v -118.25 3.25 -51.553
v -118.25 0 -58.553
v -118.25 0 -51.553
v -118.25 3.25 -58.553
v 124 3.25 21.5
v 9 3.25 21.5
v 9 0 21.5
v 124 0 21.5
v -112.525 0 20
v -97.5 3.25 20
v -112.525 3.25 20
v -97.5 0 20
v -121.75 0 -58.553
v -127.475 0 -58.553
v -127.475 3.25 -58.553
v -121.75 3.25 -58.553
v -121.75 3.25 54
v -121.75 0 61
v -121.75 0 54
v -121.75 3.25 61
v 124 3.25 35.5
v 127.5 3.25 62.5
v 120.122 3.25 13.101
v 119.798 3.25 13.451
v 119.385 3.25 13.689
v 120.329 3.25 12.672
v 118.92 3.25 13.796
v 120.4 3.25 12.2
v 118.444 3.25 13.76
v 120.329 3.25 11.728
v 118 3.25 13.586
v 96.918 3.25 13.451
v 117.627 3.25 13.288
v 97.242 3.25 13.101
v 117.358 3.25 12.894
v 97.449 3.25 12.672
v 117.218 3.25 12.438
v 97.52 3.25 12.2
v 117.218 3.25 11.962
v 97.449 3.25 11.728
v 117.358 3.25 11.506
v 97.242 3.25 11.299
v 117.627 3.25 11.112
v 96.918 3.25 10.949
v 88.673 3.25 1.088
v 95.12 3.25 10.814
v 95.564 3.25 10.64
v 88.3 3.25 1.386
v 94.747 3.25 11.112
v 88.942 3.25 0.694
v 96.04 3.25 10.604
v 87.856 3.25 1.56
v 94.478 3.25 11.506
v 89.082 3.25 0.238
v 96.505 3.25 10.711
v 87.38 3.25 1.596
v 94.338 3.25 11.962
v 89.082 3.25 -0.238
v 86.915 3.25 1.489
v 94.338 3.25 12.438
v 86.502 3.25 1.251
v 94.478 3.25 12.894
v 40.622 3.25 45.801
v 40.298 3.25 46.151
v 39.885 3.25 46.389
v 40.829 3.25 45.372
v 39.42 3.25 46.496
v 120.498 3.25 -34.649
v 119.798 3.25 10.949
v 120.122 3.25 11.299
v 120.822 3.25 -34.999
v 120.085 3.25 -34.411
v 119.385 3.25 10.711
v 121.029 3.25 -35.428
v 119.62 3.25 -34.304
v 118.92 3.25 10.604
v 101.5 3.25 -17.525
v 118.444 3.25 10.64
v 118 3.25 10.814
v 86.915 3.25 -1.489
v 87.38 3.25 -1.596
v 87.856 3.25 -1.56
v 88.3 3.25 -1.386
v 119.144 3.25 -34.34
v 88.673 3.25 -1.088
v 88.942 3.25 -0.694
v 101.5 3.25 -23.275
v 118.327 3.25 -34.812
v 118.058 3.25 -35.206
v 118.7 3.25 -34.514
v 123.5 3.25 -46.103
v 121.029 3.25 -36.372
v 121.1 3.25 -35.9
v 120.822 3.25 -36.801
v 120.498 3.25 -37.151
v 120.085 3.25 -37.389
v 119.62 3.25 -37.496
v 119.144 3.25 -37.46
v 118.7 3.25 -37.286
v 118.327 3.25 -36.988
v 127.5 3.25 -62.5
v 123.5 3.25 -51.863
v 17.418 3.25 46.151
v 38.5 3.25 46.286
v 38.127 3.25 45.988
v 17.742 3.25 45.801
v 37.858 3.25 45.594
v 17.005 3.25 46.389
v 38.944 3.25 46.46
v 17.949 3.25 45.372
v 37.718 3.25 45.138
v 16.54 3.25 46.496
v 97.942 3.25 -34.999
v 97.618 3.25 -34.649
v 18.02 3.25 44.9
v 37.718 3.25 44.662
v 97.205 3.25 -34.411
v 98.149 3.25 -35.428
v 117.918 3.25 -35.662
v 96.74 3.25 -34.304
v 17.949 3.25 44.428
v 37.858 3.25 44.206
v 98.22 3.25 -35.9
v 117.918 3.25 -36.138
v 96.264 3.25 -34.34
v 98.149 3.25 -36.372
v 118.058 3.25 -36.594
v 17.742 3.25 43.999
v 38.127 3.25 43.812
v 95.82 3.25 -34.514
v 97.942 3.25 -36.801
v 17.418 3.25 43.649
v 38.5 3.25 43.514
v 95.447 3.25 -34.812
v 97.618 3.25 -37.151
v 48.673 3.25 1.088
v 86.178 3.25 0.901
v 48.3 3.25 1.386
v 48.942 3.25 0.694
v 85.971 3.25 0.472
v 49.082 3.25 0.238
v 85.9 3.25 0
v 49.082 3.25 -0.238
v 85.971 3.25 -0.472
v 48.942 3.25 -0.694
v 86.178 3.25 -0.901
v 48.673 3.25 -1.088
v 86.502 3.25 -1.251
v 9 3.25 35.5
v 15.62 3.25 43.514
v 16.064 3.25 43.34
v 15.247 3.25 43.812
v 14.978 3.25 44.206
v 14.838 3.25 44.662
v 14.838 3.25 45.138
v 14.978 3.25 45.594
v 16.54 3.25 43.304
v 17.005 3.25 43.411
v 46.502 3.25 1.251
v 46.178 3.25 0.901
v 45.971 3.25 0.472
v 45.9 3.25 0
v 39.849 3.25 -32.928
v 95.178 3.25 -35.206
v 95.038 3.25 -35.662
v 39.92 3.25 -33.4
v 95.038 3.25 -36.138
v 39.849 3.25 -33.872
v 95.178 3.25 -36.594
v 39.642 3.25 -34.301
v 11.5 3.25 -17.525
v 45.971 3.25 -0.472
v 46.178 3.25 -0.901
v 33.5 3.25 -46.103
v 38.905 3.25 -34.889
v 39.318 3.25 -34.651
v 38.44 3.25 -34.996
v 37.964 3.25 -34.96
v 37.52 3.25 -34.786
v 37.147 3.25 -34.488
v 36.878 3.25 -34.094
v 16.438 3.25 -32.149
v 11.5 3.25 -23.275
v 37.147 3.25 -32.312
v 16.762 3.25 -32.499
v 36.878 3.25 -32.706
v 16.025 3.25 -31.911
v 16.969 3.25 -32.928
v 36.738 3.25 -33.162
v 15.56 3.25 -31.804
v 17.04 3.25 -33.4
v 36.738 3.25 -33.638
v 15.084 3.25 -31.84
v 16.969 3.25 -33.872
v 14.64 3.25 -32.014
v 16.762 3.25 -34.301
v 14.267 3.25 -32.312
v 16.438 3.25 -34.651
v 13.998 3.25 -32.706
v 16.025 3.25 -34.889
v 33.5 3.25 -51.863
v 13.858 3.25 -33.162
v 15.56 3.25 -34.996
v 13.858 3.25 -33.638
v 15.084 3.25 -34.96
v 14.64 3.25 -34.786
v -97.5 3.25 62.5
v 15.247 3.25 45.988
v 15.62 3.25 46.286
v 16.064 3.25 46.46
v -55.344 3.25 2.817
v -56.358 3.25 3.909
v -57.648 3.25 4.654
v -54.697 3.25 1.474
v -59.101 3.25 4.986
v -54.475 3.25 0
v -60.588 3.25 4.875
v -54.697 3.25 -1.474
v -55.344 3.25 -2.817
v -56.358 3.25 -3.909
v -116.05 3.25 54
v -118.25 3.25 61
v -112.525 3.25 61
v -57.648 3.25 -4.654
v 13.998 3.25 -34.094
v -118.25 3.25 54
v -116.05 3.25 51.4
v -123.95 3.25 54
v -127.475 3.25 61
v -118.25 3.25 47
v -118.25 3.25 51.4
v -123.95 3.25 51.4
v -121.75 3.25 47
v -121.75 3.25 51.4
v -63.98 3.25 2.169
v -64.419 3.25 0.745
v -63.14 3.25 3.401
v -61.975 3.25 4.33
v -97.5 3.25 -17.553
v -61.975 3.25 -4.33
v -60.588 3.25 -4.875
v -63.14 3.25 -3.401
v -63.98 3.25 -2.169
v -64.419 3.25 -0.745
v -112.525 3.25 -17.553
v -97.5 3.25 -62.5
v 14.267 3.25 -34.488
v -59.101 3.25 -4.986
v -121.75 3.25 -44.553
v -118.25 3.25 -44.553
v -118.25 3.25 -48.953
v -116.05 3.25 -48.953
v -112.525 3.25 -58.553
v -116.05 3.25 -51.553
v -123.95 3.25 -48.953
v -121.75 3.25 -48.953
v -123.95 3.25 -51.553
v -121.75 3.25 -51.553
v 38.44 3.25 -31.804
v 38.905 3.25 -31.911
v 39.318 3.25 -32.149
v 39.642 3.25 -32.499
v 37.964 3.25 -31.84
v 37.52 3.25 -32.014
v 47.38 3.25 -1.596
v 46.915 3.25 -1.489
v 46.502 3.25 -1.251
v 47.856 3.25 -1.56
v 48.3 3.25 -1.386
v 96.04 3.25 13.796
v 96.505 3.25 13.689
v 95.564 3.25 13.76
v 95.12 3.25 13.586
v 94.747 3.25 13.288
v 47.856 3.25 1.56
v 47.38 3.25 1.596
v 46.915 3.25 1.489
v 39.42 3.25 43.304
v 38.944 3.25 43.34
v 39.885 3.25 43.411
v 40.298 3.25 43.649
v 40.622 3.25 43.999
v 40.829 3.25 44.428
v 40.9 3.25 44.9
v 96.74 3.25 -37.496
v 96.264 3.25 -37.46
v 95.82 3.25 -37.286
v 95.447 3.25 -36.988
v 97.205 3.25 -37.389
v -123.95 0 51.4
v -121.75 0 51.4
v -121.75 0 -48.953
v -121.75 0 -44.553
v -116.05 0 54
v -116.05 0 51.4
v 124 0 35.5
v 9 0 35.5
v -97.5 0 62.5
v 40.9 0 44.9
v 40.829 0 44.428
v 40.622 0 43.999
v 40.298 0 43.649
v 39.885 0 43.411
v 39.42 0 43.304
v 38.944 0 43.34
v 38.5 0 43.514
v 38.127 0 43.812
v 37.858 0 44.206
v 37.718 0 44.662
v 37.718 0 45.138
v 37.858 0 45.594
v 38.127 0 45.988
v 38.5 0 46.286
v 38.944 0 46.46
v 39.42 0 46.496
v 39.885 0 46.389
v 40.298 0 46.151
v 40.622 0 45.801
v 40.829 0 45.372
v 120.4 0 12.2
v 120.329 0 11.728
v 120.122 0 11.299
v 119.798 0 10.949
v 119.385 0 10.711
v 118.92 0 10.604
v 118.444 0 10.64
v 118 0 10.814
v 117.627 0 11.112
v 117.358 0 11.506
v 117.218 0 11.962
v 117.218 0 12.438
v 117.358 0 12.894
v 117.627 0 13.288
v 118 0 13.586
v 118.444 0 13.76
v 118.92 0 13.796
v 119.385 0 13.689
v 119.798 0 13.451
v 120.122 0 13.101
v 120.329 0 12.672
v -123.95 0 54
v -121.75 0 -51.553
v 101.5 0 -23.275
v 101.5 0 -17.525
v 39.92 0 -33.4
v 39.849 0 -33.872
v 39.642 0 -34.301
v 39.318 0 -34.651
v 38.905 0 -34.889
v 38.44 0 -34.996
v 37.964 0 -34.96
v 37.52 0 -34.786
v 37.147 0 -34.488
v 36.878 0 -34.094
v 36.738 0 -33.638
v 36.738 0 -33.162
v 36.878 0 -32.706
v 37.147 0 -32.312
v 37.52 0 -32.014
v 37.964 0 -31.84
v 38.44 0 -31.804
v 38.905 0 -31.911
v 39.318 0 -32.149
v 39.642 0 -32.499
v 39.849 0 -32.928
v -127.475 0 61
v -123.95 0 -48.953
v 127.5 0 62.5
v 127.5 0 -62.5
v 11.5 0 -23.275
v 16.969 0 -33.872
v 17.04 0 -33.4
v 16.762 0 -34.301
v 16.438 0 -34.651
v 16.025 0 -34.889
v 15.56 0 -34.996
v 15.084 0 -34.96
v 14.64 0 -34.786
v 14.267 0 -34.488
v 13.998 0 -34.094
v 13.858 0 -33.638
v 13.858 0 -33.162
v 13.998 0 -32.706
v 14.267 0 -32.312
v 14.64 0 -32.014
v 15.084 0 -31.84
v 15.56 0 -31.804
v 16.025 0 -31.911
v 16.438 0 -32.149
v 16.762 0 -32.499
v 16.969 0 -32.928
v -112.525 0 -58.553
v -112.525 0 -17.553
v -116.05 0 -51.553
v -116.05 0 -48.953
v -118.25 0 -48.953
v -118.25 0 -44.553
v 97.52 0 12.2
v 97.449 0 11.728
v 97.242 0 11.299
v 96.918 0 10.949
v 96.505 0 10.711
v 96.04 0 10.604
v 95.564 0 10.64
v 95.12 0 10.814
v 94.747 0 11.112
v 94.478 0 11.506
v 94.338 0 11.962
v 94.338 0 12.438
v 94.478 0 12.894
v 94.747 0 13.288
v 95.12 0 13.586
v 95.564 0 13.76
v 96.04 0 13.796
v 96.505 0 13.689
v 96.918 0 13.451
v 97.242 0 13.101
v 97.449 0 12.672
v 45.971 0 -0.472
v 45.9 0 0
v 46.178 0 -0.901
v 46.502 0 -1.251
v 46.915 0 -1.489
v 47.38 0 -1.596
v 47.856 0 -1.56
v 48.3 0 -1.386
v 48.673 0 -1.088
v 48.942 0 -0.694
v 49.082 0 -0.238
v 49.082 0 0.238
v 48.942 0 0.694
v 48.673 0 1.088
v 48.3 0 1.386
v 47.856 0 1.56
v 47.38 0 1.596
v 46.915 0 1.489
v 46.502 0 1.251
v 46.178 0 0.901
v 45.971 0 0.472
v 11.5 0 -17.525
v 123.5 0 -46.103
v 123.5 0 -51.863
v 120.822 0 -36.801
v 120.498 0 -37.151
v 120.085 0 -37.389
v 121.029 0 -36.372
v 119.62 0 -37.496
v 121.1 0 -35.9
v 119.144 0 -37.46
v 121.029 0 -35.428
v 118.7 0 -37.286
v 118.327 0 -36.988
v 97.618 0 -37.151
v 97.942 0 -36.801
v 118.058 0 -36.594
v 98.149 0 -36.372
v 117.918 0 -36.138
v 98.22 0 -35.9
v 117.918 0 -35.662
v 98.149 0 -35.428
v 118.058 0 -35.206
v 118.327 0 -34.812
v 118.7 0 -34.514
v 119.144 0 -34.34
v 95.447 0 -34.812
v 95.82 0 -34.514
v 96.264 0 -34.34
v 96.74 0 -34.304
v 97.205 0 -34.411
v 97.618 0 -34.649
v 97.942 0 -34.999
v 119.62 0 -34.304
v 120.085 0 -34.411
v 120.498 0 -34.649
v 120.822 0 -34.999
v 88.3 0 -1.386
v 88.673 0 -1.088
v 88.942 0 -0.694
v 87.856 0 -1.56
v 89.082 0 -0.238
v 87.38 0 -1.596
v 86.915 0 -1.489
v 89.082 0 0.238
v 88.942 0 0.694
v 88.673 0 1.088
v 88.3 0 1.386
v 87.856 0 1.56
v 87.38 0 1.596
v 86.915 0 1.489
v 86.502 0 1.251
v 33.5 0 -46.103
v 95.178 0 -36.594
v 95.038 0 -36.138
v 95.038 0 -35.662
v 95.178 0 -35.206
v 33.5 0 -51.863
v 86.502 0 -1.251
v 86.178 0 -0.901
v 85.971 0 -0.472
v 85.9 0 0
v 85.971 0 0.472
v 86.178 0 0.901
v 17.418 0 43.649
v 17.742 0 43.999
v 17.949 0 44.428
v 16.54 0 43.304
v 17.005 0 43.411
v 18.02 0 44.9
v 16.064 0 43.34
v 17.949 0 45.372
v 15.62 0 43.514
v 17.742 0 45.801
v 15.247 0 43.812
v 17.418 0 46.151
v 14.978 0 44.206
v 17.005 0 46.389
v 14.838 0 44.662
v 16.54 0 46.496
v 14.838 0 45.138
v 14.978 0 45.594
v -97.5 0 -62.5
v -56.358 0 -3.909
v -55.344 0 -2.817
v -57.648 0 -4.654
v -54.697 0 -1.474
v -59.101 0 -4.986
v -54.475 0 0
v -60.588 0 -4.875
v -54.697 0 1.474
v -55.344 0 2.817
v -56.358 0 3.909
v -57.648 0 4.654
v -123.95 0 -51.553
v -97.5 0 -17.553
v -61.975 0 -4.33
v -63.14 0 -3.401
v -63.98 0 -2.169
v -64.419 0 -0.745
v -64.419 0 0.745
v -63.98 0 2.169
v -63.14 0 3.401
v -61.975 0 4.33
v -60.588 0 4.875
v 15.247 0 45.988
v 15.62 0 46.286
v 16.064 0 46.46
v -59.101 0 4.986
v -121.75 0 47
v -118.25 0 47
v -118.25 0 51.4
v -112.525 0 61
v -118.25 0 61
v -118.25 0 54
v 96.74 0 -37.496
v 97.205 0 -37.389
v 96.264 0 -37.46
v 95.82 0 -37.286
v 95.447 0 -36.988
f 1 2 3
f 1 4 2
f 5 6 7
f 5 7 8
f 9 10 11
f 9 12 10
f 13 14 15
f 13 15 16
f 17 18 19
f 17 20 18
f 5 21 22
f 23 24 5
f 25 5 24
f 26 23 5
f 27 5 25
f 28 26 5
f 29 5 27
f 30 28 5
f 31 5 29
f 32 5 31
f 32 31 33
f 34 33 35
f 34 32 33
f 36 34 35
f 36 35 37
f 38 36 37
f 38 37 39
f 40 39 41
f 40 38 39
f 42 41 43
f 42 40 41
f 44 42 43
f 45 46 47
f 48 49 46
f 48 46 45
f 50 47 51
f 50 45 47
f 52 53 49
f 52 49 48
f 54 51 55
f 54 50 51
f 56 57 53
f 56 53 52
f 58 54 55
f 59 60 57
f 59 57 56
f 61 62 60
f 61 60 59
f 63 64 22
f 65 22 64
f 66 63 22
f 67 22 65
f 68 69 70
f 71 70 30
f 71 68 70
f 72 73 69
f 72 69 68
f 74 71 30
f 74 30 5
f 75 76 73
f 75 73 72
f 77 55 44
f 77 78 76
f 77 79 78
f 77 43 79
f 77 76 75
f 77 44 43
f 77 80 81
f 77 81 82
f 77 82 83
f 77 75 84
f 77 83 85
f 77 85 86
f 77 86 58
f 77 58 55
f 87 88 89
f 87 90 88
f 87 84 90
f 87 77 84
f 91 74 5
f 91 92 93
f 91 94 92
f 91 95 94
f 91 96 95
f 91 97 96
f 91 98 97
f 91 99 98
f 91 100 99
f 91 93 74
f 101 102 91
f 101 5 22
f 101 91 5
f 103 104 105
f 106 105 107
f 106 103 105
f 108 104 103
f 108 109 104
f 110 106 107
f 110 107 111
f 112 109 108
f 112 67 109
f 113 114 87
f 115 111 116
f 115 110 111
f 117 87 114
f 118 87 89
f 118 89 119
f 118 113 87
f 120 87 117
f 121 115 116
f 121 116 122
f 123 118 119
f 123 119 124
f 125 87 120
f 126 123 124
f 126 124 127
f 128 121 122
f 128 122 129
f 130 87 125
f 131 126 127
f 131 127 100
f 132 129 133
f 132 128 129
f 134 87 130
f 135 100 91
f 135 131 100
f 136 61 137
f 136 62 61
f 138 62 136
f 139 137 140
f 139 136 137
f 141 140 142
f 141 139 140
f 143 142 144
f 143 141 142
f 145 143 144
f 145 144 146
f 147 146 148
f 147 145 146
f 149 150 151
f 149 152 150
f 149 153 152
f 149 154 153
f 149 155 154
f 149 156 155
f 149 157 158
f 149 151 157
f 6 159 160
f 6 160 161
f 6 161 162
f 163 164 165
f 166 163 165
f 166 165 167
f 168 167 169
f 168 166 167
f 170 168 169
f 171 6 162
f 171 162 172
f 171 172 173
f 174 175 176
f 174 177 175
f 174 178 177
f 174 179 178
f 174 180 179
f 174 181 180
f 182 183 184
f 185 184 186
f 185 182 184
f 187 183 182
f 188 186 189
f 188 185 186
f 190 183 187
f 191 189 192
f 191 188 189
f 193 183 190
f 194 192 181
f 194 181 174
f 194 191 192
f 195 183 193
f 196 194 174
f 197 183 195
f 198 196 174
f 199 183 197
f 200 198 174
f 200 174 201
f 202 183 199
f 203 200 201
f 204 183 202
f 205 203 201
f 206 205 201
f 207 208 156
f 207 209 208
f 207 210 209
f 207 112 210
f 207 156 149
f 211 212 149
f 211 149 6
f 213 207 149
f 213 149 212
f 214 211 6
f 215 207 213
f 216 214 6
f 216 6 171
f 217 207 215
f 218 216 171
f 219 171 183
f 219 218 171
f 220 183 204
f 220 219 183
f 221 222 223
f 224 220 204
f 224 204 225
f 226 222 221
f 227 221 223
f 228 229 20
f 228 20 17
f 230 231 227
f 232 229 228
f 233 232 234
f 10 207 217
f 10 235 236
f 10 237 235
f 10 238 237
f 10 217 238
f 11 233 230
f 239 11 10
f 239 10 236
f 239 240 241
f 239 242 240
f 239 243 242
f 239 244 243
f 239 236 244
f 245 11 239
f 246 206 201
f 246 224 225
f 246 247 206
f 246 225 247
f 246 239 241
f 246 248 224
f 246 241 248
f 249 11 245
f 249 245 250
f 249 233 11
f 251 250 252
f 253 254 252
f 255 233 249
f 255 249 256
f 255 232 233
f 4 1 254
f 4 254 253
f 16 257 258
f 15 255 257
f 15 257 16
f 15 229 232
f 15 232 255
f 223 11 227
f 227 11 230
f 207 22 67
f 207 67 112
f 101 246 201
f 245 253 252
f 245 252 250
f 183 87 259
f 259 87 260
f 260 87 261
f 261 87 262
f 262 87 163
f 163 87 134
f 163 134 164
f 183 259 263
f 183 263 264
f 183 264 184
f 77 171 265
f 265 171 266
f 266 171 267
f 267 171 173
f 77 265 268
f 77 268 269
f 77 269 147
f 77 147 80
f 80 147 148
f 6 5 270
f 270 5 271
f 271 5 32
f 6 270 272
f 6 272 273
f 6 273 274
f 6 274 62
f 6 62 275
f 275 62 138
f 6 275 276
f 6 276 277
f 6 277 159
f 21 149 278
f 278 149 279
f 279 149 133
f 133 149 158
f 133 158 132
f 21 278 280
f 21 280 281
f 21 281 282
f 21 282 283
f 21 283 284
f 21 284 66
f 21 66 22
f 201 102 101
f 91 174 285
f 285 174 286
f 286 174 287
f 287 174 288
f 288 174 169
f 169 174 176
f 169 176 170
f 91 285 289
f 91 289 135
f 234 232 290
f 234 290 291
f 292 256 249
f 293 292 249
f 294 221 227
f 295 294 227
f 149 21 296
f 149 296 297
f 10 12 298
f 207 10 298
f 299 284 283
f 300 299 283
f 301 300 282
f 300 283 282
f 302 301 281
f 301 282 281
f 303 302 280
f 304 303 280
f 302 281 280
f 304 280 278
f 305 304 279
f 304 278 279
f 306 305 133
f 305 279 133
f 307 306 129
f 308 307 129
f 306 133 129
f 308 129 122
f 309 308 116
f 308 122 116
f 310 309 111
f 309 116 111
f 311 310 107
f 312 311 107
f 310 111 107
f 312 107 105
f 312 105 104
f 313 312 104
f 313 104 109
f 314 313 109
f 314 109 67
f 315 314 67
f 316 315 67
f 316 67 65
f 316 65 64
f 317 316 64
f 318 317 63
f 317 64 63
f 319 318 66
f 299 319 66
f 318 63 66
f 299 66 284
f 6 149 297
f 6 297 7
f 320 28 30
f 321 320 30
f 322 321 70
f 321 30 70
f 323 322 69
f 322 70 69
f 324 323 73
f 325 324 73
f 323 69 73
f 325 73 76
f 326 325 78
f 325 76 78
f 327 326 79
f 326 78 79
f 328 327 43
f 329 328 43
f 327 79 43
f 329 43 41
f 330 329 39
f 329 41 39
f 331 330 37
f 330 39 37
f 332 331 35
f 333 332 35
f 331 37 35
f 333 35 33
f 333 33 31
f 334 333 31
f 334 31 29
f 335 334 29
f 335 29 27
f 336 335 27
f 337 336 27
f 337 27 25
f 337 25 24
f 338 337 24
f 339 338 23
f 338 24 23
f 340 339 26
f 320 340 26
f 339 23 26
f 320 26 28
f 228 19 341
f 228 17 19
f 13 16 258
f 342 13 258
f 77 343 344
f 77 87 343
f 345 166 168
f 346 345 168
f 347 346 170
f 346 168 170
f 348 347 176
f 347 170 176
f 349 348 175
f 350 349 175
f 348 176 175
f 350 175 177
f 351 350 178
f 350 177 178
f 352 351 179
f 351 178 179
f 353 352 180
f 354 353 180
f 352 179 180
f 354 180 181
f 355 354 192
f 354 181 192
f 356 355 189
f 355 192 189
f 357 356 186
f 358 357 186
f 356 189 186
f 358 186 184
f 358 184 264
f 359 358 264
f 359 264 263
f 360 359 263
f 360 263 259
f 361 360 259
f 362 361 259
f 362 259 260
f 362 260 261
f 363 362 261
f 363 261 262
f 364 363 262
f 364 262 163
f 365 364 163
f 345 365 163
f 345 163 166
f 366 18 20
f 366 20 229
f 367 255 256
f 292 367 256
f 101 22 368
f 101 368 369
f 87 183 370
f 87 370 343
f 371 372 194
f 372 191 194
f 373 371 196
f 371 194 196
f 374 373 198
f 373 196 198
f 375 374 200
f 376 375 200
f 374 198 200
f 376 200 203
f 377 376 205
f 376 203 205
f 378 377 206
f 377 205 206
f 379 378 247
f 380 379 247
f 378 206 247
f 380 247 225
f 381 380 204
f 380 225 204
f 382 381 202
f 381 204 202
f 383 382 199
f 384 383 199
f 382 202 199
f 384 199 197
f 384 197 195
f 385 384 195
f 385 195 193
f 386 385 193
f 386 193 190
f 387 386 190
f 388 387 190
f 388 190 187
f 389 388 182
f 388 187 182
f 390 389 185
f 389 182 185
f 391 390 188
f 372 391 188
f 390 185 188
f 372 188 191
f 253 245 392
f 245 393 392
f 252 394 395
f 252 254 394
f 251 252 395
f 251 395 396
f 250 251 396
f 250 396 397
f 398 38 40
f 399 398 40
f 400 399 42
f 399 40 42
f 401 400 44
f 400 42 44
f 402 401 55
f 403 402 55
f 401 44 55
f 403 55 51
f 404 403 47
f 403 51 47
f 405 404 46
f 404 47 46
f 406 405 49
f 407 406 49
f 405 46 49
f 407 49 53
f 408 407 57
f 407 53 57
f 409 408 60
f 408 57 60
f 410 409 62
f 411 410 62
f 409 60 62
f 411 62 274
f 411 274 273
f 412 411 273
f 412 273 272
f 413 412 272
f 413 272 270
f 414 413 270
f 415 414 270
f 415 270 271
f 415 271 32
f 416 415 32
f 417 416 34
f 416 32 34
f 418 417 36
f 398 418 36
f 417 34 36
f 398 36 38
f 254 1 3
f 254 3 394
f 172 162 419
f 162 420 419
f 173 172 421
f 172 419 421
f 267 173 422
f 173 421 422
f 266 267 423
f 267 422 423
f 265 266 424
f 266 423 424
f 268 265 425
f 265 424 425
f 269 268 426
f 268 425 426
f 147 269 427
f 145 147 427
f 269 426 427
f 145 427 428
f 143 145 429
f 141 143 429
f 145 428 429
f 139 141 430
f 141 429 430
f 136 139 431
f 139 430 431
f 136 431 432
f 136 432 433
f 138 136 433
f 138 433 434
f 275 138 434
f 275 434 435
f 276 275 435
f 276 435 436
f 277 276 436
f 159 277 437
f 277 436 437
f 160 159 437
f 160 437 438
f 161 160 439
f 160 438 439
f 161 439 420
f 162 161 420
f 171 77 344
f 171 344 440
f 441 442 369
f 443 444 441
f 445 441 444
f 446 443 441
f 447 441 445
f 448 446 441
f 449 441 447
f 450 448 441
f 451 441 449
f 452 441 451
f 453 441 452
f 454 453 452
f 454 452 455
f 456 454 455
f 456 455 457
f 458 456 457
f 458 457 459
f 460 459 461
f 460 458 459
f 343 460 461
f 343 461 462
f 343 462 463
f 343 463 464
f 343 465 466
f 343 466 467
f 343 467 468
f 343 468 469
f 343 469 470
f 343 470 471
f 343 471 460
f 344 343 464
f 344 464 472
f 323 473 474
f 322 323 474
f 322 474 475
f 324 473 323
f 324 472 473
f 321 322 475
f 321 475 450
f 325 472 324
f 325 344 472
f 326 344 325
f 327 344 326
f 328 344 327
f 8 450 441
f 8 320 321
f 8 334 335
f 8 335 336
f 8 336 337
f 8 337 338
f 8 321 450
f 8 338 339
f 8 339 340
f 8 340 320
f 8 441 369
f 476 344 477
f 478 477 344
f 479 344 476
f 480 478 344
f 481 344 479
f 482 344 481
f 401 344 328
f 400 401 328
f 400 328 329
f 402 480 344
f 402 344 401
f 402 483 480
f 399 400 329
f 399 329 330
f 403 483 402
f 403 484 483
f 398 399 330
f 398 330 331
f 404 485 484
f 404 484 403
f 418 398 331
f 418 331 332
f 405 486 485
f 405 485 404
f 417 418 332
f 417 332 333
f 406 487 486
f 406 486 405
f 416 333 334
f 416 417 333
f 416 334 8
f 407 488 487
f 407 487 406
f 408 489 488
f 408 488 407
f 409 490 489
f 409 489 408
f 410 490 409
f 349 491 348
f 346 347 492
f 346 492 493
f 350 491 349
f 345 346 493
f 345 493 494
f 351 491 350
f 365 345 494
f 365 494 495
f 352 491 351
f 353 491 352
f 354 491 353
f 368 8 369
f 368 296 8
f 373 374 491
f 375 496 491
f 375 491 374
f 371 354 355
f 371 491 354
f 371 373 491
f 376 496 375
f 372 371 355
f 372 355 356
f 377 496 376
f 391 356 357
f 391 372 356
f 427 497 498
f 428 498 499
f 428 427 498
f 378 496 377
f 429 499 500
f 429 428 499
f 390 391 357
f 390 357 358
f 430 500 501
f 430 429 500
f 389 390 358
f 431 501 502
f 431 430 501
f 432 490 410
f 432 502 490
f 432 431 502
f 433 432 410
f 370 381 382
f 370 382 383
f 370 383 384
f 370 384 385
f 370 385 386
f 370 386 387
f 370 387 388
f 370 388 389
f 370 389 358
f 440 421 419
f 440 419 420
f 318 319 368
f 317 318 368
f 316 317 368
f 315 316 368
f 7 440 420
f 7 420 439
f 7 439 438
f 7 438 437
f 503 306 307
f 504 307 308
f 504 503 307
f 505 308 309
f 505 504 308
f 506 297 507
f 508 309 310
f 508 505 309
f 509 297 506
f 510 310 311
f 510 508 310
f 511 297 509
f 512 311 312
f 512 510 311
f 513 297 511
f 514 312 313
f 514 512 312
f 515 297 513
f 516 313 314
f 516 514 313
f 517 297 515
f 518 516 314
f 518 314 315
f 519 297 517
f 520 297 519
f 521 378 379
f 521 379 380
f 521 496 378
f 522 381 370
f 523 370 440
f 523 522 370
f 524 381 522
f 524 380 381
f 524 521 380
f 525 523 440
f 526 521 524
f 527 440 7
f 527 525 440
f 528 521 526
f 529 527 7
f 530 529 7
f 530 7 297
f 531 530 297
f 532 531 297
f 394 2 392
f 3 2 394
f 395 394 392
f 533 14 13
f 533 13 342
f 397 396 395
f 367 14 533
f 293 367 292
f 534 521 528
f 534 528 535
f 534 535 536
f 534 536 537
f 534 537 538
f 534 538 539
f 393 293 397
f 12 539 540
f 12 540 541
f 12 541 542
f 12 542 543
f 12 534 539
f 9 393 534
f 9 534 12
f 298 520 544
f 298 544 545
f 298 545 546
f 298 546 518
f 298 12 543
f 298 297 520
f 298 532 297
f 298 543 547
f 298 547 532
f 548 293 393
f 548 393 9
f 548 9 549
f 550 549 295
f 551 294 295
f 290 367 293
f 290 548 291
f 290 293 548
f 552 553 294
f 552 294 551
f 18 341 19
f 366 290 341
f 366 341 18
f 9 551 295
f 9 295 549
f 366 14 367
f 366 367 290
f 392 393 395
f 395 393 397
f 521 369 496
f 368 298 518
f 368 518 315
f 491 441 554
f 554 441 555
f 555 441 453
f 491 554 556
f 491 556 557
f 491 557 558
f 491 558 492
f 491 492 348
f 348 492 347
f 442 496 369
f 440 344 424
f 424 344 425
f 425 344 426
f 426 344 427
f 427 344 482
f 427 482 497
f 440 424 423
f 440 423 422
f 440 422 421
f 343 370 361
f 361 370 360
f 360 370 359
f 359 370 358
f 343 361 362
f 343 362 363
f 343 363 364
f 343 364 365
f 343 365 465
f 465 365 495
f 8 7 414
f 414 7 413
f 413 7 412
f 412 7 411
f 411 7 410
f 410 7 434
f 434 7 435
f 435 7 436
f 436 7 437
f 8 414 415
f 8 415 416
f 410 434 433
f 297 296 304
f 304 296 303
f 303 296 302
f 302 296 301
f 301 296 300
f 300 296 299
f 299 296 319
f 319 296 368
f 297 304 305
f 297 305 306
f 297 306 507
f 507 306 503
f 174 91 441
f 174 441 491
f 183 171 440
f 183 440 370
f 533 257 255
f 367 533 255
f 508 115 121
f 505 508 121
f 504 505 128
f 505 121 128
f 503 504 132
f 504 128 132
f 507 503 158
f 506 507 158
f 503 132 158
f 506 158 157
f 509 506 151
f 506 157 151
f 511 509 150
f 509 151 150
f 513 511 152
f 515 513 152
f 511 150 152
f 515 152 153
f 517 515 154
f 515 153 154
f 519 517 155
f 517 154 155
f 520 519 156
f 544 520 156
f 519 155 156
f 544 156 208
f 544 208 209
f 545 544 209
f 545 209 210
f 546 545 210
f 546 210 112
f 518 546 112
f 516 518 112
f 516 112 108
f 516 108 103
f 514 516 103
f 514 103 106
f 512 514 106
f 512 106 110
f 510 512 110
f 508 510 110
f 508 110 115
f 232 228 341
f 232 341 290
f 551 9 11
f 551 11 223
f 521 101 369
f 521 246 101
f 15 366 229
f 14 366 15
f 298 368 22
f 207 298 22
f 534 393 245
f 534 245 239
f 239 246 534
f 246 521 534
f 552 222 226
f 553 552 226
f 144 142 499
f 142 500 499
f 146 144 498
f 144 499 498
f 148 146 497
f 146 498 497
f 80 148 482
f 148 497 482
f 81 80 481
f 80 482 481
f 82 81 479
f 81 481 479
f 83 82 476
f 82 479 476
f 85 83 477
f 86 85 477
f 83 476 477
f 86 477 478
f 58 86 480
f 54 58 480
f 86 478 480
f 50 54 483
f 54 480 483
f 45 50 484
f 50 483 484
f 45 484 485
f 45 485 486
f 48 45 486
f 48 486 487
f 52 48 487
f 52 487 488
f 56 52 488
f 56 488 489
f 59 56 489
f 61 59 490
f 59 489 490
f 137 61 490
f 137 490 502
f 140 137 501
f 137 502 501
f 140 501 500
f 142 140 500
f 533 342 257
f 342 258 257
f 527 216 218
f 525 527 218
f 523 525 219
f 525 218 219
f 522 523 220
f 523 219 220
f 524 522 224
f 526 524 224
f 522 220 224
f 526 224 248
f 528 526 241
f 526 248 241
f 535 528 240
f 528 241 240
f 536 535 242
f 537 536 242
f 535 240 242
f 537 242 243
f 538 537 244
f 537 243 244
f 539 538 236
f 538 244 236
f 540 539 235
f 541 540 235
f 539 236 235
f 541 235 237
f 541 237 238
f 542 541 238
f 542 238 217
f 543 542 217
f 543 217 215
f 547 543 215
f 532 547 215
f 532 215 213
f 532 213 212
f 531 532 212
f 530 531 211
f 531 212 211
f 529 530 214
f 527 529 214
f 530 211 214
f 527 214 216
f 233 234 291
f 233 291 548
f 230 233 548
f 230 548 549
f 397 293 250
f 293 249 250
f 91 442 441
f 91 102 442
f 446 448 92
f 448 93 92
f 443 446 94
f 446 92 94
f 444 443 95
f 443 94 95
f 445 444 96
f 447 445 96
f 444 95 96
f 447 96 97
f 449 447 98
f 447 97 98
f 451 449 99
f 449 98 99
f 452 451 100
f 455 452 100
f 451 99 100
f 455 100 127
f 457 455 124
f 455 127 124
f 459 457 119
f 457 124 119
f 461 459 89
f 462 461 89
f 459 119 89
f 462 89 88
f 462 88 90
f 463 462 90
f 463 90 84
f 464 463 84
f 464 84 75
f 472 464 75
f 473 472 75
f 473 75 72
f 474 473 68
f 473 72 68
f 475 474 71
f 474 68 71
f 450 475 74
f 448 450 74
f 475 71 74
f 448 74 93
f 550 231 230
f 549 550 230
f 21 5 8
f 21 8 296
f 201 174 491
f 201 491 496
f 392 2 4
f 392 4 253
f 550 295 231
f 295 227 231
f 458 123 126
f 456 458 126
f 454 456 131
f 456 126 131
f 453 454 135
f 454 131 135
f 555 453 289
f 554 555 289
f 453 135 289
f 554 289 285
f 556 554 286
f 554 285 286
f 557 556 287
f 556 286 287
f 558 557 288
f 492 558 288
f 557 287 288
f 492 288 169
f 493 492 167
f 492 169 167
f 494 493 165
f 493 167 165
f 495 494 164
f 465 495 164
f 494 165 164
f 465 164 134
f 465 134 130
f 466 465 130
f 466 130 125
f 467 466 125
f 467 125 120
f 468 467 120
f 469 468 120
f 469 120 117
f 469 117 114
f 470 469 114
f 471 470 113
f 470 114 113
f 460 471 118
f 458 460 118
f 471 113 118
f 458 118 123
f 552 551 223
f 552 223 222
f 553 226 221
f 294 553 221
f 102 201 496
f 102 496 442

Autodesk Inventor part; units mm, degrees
ref_plane "YZ Plane" through (0, 0, 0) normal (1, 0, 0) x (0, 1, 0)
ref_plane "XZ Plane" through (0, 0, 0) normal (0, 1, 0) x (-1, 0, 0)
ref_plane "XY Plane" through (0, 0, 0) normal (0, 0, 1) x (1, 0, 0)
sketch "Sketch1" plane through (0, 0, 0) normal (0, 1, 0) x (-1, 0, 0)
  line L0 (-97.5, -62.5) -> (97.5, -62.5)
  line L1 (97.5, 62.5) -> (-97.5, 62.5)
  line L2 (-97.5, 62.5) -> (-97.5, -62.5)
  line L3 (-97.5, -62.5) -> (97.5, 62.5) construction
  line L4 (97.5, -62.5) -> (-97.5, 62.5) construction
  line L5 (97.5, 20) -> (112.525, 20)
  line L6 (127.475, 21.2237) -> (127.475, -18.7763)
  line L7 (112.525, -17.5526) -> (97.5, -17.5526)
  line L8 (97.5, -62.5) -> (97.5, -17.5526)
  line L9 (97.5, 20) -> (97.5, 62.5)
  line L10 (112.525, 20) -> (112.525, 61)
  line L11 (127.475, 61) -> (127.475, 21.2237)
  line L12 (127.475, 1.2237) -> (97.475, 1.2237) construction
  line L13 (112.525, -17.5526) -> (112.525, -58.5526)
  line L14 (127.475, -58.5526) -> (127.475, -18.7763)
  line L15 (119.975, 61) -> (121.775, 61) construction
  line L16 (112.525, 61) -> (118.225, 61)
  line L17 (127.475, 61) -> (121.775, 61)
  line L18 (119.975, -58.5526) -> (121.775, -58.5526) construction
  line L19 (112.525, -58.5526) -> (118.225, -58.5526)
  line L20 (127.475, -58.5526) -> (121.775, -58.5526)
  line L21 (119.975, -58.5526) -> (121.775, -58.5526) construction
  line L22 (121.775, -58.5526) -> (121.775, -56.5526)
  line L23 (118.225, -58.5526) -> (118.225, -56.5526)
  line L24 (121.775, -56.5526) -> (125.775, -56.5526)
  line L25 (125.775, -56.5526) -> (125.775, -53.5526)
  line L26 (114.175, -53.5526) -> (118.175, -53.5526)
  line L27 (114.175, -56.5526) -> (114.175, -53.5526)
  line L28 (118.225, -56.5526) -> (114.175, -56.5526)
  line L29 (112.525, -58.5526) -> (118.225, -58.5526)
  line L30 (127.475, -58.5526) -> (121.775, -58.5526)
  line L31 (127.475, 61) -> (127.475, 79) construction
  line L32 (-97.5, 0) -> (-67.5, 0) construction
  line L33 (-67.5, 62.5) -> (-67.5, -62.5) construction
  line L34 (127.475, 79) -> (-67.5, 0) construction
  line L35 (127.475, -58.5526) -> (127.475, -76.5526) construction
  line L36 (127.475, -76.5526) -> (-67.5, 0) construction
  line L37 (-97.5, 62.5) -> (-117.5, 62.5)
  line L38 (-117.5, 62.5) -> (-117.5, -62.5)
  line L39 (-117.5, -62.5) -> (-97.5, -62.5)
  line L40 (-97.5, -62.5) -> (-97.5, 62.5)
  line L41 (-67.5, 0) -> (-47.5, 0) construction
  circle A0 centre (-47.5, 0) radius 1.6
  line L42 (-67.5, 0) -> (-87.5, 0) construction
  circle A1 centre (-87.5, 0) radius 1.6
  line L43 (121.775, 61) -> (118.225, 61)
  line L44 (125.775, -53.5526) -> (118.175, -53.5526)
  line L45 (121.775, -58.5526) -> (118.225, -58.5526)
  point P0 (0, 0)
  point P1 (-97.5, -62.5)
  dimension "d0" = 195
  dimension "d1" = 125
  dimension "d3" = 30
  dimension "d4" = 40
  dimension "d5" = 15
  dimension "d6" = 41
  dimension "d12" = 1.8
  dimension "d21" = 30
  dimension "d23" = 1.5
  dimension "d28" = 18
  dimension "d29" = 30
  dimension "d30" = 18
  dimension "d35" = 20
  dimension "d36" = 125
  dimension "d41" = 20
  dimension "d42" = 3.2
  dimension "d43" = 20
  dimension "d47" = 3.2
extrude "Extrusion1" add sketch "Sketch1" along normal blind 3.25 contours L2 L1 L9 L5 L10 L16 L43 L17 L11 L6 L14 L20 L22 L24 L25 L44 L26 L27 L28 L23 L19 L13 L7 L8 L0 | L23 L28 L27 L26 L44 L25 L24 L22 L45 | A0 | A1
sketch "Sketch2" plane through (0, 3.25, 0) normal (0, 1, 0) x (1, 0, 0)
  line L0 (-127.475, 58.5526) -> (-127.475, -61) construction
  line L1 (-127.475, 0) -> (-59.475, 0) construction
  circle A0 centre (-59.475, 0) radius 5
  point P0 (0, 0)
  dimension "d31" = 68
  dimension "d32" = 10
extrude "Extrusion2" cut sketch "Sketch2" against normal blind 10
sketch "Sketch3" plane through (97.5, 0, 62.5) normal (1, 0, 0) x (0, 0, -1)
  line L0 (125, 0) -> (80.0526, 0) projected
  line L1 (0, 3.25) -> (125, 3.25)
  line L2 (125, 3.25) -> (125, 0)
  line L3 (125, 0) -> (0, 0)
  line L4 (0, 0) -> (0, 3.25)
  point P0 (62.5, 0)
extrude "Extrusion4" add sketch "Sketch3" along normal blind 30
extrude "Extrusion5" cut sketch "Sketch1" along normal blind 4 contours A0 | A1
sketch "Sketch4" plane through (0, 3.25, 0) normal (0, 1, 0) x (1, 0, 0)
  line L0 (-97.5, -62.5) -> (127.5, -62.5) construction
  line L1 (39.3, -62.5) -> (39.3, -44.9) construction
  line L2 (127.5, 62.5) -> (127.5, -62.5) construction
  circle A0 centre (39.3, -44.9) radius 1.6
  circle A1 centre (16.42, -44.9) radius 1.6
  line L3 (39.3, -44.9) -> (16.42, -44.9) construction
  line L4 (118.8, -62.5) -> (118.8, -12.2) construction
  circle A2 centre (118.8, -12.2) radius 1.6
  line L5 (118.8, -12.2) -> (95.92, -12.2) construction
  circle A3 centre (95.92, -12.2) radius 1.6
  line L6 (-97.5, 62.5) -> (127.5, 62.5) construction
  line L7 (119.5, 62.5) -> (119.5, 35.9) construction
  circle A4 centre (119.5, 35.9) radius 1.6
  line L8 (119.5, 35.9) -> (96.62, 35.9) construction
  circle A5 centre (96.62, 35.9) radius 1.6
  line L9 (38.32, 62.5) -> (38.32, 33.4) construction
  circle A6 centre (38.32, 33.4) radius 1.6
  line L10 (38.32, 33.4) -> (15.44, 33.4) construction
  circle A7 centre (15.44, 33.4) radius 1.6
  point P0 (0, 0)
  point P1 (119.5, 49.2)
  dimension "d48" = 88.2
  dimension "d49" = 17.6
  dimension "d50" = 3.2
  dimension "d51" = 3.2
  dimension "d52" = 22.88
  dimension "d53" = 50.3
  dimension "d54" = 8.7
  dimension "d55" = 3.2
  dimension "d56" = 3.2
  dimension "d57" = 22.88
  dimension "d58" = 8
  dimension "d59" = 26.6
  dimension "d60" = 3.2
  dimension "d61" = 22.88
  dimension "d62" = 3.2
  dimension "d63" = 89.18
  dimension "d64" = 29.1
  dimension "d65" = 3.2
  dimension "d66" = 22.88
  dimension "d67" = 3.2
extrude "Extrusion6" cut sketch "Sketch4" against normal blind 10
sketch "Sketch5" plane through (0, 3.25, 0) normal (0, 1, 0) x (1, 0, 0)
  circle A0 centre (119.5, 35.9) radius 1.6 construction
  line L0 (123.5, 48.9829) -> (78.5, 48.9829) construction
  line L1 (123.5, 46.1029) -> (33.5, 46.1029)
  line L2 (33.5, 46.1029) -> (33.5, 51.8629)
  line L3 (33.5, 51.8629) -> (123.5, 51.8629)
  line L4 (123.5, 51.8629) -> (123.5, 46.1029)
  line L5 (123.5, 46.1029) -> (33.5, 51.8629) construction
  line L6 (33.5, 46.1029) -> (123.5, 51.8629) construction
  line L7 (127.5, 62.5) -> (127.5, -62.5) projected
  circle A1 centre (15.44, 33.4) radius 1.6 construction
  line L8 (11.5, 20.4) -> (56.5, 20.4) construction
  line L9 (101.5, 17.525) -> (11.5, 17.525)
  line L10 (11.5, 17.525) -> (11.5, 23.275)
  line L11 (11.5, 23.275) -> (101.5, 23.275)
  line L12 (101.5, 23.275) -> (101.5, 17.525)
  line L13 (101.5, 17.525) -> (11.5, 23.275) construction
  line L14 (11.5, 17.525) -> (101.5, 23.275) construction
  circle A2 centre (95.92, -12.2) radius 1.6 construction
  line L15 (111.5, -28.5) -> (66.5, -28.5) construction
  line L16 (124, -35.5) -> (9, -35.5)
  line L17 (9, -35.5) -> (9, -21.5)
  line L18 (9, -21.5) -> (124, -21.5)
  line L19 (124, -21.5) -> (124, -35.5)
  line L20 (124, -35.5) -> (9, -21.5) construction
  line L21 (9, -35.5) -> (124, -21.5) construction
  line L22 (-97.5, -62.5) -> (127.5, -62.5) projected
  point P0 (0, 0)
  dimension "d71" = 45
  dimension "d72" = 90
  dimension "d73" = 5.76
  dimension "d76" = 4
  dimension "d78" = 45
  dimension "d79" = 90
  dimension "d80" = 5.75
  dimension "d82" = 26
  dimension "d84" = 45
  dimension "d85" = 115
  dimension "d86" = 14
  dimension "d87" = 3.5
  dimension "d88" = 27
extrude "Extrusion7" cut sketch "Sketch5" against normal blind 10
sketch "Sketch8" plane through (0, 3.25, 0) normal (0, 1, 0) x (1, 0, 0)
  line L0 (-127.475, -61) -> (-112.525, -61) construction
  line L1 (-120, -61) -> (-121.75, -61) construction
  line L2 (-120, -61) -> (-118.25, -61) construction
  line L3 (-121.75, -61) -> (-121.75, -54)
  line L4 (-121.75, -54) -> (-123.95, -54)
  line L5 (-123.95, -54) -> (-123.95, -51.4)
  line L6 (-123.95, -51.4) -> (-121.75, -51.4)
  line L7 (-121.75, -51.4) -> (-121.75, -47)
  line L8 (-121.75, -47) -> (-118.25, -47)
  line L9 (-120, -61) -> (-120, -55.9834) construction
  line L10 (-118.25, -61) -> (-118.25, -54)
  line L11 (-118.25, -54) -> (-116.05, -54)
  line L12 (-116.05, -54) -> (-116.05, -51.4)
  line L13 (-116.05, -51.4) -> (-118.25, -51.4)
  line L14 (-118.25, -51.4) -> (-118.25, -47)
  line L15 (-127.475, 58.5526) -> (-127.475, -61) construction
  line L16 (-127.475, -1.2237) -> (-118.25, -1.2237) construction
  line L17 (-121.75, 58.5526) -> (-121.75, 51.5526)
  line L18 (-121.75, 51.5526) -> (-123.95, 51.5526)
  line L19 (-123.95, 51.5526) -> (-123.95, 48.9526)
  line L20 (-123.95, 48.9526) -> (-121.75, 48.9526)
  line L21 (-121.75, 48.9526) -> (-121.75, 44.5526)
  line L22 (-121.75, 44.5526) -> (-118.25, 44.5526)
  line L23 (-120, 58.5526) -> (-120, 53.536) construction
  line L24 (-118.25, 58.5526) -> (-118.25, 51.5526)
  line L25 (-118.25, 51.5526) -> (-116.05, 51.5526)
  line L26 (-116.05, 51.5526) -> (-116.05, 48.9526)
  line L27 (-116.05, 48.9526) -> (-118.25, 48.9526)
  line L28 (-118.25, 48.9526) -> (-118.25, 44.5526)
  line L29 (-121.75, -61) -> (-118.25, -61)
  line L30 (-121.75, 58.5526) -> (-118.25, 58.5526)
  line L31 (-112.525, 58.5526) -> (-127.475, 58.5526) projected
  point P0 (0, 0)
  dimension "d102" = 1.75
  dimension "d103" = 1.75
  dimension "d104" = 7
  dimension "d105" = 2.2
  dimension "d106" = 2.6
  dimension "d108" = 14
  dimension "d109" = 3.5
  dimension "d110" = 7
  dimension "d111" = 2.2
  dimension "d112" = 2.6
extrude "Extrusion10" cut sketch "Sketch8" against normal blind 3.25
properties part number "suelo_imp"
